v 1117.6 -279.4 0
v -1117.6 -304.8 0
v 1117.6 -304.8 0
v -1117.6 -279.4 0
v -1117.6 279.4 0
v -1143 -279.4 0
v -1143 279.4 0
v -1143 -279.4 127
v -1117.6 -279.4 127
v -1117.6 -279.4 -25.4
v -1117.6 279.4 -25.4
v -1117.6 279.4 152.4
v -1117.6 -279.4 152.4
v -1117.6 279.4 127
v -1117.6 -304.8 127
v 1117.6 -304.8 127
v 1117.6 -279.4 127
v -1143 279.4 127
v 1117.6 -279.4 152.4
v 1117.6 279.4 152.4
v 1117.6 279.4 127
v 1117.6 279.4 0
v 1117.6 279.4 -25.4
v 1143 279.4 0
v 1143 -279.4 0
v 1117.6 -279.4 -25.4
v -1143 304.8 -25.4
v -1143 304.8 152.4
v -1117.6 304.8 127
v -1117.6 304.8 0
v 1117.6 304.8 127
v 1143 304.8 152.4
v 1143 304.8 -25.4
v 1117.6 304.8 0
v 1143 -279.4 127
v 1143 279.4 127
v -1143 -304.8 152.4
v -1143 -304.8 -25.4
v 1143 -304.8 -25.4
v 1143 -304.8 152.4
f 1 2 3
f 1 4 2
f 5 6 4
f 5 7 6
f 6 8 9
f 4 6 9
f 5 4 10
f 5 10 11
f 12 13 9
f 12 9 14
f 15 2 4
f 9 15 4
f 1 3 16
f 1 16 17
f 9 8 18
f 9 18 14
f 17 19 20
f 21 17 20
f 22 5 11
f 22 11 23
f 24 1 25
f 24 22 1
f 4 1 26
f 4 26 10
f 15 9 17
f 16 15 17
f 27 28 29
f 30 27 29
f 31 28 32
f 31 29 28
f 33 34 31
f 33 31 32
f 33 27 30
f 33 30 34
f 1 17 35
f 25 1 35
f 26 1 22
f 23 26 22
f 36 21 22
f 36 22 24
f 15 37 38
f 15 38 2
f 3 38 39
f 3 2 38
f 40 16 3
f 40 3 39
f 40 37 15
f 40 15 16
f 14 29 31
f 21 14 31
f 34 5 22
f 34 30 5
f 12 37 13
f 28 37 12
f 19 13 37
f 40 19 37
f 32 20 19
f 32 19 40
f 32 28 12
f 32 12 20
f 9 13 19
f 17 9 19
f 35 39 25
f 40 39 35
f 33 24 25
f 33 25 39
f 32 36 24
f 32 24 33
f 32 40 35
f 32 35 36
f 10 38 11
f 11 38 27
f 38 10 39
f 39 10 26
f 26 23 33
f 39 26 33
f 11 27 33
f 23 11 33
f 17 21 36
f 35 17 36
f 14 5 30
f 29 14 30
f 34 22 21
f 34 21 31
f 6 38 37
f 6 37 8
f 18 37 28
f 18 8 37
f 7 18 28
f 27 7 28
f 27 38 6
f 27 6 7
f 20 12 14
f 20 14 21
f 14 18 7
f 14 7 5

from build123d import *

# Parameters (mm, degrees)
F0_W     = 25.4
F0_H     = 25.4
F0_W_2   = 2235.2
F0_H_2   = 558.8
F1_DEPTH = 25.4
F2_DEPTH = 152.4
F4_W     = 2286
F4_H     = 609.6
F4_W_2   = 2235.2
F4_H_2   = 558.8
F5_DEPTH = 25.4


with BuildPart() as f1:
    # F0 (on Top) → F1 (new body)
    with BuildSketch(Plane.XY):
        with Locations((-1130.3, -292.1)):
            Rectangle(F0_W, F0_H)
        with Locations((0, -292.1)):
            Rectangle(F0_W_2, F0_H)
        with Locations((-1130.3, 0)):
            Rectangle(F0_W, F0_H_2)
        with Locations((1130.3, -292.1)):
            Rectangle(F0_W, F0_H)
        with Locations((-1130.3, 292.1)):
            Rectangle(F0_W, F0_H)
        with Locations((1130.3, 0)):
            Rectangle(F0_W, F0_H_2)
        with Locations((0, 292.1)):
            Rectangle(F0_W_2, F0_H)
        with Locations((1130.3, 292.1)):
            Rectangle(F0_W, F0_H)
    extrude(amount=-F1_DEPTH)

    # F0 (on Top) → F2 (join)
    with BuildSketch(Plane.XY):
        with Locations((-1130.3, 292.1)):
            Rectangle(F0_W, F0_H)
        with Locations((-1130.3, -292.1)):
            Rectangle(F0_W, F0_H)
        with Locations((1130.3, 292.1)):
            Rectangle(F0_W, F0_H)
        with Locations((1130.3, -292.1)):
            Rectangle(F0_W, F0_H)
    extrude(amount=F2_DEPTH)

    # F4 (on offset) → F5 (join)
    with BuildSketch(Plane.XY.offset(152.4)):
        Rectangle(F4_W, F4_H)
        Rectangle(F4_W_2, F4_H_2, mode=Mode.SUBTRACT)
    extrude(amount=-F5_DEPTH)


solid = f1.part
